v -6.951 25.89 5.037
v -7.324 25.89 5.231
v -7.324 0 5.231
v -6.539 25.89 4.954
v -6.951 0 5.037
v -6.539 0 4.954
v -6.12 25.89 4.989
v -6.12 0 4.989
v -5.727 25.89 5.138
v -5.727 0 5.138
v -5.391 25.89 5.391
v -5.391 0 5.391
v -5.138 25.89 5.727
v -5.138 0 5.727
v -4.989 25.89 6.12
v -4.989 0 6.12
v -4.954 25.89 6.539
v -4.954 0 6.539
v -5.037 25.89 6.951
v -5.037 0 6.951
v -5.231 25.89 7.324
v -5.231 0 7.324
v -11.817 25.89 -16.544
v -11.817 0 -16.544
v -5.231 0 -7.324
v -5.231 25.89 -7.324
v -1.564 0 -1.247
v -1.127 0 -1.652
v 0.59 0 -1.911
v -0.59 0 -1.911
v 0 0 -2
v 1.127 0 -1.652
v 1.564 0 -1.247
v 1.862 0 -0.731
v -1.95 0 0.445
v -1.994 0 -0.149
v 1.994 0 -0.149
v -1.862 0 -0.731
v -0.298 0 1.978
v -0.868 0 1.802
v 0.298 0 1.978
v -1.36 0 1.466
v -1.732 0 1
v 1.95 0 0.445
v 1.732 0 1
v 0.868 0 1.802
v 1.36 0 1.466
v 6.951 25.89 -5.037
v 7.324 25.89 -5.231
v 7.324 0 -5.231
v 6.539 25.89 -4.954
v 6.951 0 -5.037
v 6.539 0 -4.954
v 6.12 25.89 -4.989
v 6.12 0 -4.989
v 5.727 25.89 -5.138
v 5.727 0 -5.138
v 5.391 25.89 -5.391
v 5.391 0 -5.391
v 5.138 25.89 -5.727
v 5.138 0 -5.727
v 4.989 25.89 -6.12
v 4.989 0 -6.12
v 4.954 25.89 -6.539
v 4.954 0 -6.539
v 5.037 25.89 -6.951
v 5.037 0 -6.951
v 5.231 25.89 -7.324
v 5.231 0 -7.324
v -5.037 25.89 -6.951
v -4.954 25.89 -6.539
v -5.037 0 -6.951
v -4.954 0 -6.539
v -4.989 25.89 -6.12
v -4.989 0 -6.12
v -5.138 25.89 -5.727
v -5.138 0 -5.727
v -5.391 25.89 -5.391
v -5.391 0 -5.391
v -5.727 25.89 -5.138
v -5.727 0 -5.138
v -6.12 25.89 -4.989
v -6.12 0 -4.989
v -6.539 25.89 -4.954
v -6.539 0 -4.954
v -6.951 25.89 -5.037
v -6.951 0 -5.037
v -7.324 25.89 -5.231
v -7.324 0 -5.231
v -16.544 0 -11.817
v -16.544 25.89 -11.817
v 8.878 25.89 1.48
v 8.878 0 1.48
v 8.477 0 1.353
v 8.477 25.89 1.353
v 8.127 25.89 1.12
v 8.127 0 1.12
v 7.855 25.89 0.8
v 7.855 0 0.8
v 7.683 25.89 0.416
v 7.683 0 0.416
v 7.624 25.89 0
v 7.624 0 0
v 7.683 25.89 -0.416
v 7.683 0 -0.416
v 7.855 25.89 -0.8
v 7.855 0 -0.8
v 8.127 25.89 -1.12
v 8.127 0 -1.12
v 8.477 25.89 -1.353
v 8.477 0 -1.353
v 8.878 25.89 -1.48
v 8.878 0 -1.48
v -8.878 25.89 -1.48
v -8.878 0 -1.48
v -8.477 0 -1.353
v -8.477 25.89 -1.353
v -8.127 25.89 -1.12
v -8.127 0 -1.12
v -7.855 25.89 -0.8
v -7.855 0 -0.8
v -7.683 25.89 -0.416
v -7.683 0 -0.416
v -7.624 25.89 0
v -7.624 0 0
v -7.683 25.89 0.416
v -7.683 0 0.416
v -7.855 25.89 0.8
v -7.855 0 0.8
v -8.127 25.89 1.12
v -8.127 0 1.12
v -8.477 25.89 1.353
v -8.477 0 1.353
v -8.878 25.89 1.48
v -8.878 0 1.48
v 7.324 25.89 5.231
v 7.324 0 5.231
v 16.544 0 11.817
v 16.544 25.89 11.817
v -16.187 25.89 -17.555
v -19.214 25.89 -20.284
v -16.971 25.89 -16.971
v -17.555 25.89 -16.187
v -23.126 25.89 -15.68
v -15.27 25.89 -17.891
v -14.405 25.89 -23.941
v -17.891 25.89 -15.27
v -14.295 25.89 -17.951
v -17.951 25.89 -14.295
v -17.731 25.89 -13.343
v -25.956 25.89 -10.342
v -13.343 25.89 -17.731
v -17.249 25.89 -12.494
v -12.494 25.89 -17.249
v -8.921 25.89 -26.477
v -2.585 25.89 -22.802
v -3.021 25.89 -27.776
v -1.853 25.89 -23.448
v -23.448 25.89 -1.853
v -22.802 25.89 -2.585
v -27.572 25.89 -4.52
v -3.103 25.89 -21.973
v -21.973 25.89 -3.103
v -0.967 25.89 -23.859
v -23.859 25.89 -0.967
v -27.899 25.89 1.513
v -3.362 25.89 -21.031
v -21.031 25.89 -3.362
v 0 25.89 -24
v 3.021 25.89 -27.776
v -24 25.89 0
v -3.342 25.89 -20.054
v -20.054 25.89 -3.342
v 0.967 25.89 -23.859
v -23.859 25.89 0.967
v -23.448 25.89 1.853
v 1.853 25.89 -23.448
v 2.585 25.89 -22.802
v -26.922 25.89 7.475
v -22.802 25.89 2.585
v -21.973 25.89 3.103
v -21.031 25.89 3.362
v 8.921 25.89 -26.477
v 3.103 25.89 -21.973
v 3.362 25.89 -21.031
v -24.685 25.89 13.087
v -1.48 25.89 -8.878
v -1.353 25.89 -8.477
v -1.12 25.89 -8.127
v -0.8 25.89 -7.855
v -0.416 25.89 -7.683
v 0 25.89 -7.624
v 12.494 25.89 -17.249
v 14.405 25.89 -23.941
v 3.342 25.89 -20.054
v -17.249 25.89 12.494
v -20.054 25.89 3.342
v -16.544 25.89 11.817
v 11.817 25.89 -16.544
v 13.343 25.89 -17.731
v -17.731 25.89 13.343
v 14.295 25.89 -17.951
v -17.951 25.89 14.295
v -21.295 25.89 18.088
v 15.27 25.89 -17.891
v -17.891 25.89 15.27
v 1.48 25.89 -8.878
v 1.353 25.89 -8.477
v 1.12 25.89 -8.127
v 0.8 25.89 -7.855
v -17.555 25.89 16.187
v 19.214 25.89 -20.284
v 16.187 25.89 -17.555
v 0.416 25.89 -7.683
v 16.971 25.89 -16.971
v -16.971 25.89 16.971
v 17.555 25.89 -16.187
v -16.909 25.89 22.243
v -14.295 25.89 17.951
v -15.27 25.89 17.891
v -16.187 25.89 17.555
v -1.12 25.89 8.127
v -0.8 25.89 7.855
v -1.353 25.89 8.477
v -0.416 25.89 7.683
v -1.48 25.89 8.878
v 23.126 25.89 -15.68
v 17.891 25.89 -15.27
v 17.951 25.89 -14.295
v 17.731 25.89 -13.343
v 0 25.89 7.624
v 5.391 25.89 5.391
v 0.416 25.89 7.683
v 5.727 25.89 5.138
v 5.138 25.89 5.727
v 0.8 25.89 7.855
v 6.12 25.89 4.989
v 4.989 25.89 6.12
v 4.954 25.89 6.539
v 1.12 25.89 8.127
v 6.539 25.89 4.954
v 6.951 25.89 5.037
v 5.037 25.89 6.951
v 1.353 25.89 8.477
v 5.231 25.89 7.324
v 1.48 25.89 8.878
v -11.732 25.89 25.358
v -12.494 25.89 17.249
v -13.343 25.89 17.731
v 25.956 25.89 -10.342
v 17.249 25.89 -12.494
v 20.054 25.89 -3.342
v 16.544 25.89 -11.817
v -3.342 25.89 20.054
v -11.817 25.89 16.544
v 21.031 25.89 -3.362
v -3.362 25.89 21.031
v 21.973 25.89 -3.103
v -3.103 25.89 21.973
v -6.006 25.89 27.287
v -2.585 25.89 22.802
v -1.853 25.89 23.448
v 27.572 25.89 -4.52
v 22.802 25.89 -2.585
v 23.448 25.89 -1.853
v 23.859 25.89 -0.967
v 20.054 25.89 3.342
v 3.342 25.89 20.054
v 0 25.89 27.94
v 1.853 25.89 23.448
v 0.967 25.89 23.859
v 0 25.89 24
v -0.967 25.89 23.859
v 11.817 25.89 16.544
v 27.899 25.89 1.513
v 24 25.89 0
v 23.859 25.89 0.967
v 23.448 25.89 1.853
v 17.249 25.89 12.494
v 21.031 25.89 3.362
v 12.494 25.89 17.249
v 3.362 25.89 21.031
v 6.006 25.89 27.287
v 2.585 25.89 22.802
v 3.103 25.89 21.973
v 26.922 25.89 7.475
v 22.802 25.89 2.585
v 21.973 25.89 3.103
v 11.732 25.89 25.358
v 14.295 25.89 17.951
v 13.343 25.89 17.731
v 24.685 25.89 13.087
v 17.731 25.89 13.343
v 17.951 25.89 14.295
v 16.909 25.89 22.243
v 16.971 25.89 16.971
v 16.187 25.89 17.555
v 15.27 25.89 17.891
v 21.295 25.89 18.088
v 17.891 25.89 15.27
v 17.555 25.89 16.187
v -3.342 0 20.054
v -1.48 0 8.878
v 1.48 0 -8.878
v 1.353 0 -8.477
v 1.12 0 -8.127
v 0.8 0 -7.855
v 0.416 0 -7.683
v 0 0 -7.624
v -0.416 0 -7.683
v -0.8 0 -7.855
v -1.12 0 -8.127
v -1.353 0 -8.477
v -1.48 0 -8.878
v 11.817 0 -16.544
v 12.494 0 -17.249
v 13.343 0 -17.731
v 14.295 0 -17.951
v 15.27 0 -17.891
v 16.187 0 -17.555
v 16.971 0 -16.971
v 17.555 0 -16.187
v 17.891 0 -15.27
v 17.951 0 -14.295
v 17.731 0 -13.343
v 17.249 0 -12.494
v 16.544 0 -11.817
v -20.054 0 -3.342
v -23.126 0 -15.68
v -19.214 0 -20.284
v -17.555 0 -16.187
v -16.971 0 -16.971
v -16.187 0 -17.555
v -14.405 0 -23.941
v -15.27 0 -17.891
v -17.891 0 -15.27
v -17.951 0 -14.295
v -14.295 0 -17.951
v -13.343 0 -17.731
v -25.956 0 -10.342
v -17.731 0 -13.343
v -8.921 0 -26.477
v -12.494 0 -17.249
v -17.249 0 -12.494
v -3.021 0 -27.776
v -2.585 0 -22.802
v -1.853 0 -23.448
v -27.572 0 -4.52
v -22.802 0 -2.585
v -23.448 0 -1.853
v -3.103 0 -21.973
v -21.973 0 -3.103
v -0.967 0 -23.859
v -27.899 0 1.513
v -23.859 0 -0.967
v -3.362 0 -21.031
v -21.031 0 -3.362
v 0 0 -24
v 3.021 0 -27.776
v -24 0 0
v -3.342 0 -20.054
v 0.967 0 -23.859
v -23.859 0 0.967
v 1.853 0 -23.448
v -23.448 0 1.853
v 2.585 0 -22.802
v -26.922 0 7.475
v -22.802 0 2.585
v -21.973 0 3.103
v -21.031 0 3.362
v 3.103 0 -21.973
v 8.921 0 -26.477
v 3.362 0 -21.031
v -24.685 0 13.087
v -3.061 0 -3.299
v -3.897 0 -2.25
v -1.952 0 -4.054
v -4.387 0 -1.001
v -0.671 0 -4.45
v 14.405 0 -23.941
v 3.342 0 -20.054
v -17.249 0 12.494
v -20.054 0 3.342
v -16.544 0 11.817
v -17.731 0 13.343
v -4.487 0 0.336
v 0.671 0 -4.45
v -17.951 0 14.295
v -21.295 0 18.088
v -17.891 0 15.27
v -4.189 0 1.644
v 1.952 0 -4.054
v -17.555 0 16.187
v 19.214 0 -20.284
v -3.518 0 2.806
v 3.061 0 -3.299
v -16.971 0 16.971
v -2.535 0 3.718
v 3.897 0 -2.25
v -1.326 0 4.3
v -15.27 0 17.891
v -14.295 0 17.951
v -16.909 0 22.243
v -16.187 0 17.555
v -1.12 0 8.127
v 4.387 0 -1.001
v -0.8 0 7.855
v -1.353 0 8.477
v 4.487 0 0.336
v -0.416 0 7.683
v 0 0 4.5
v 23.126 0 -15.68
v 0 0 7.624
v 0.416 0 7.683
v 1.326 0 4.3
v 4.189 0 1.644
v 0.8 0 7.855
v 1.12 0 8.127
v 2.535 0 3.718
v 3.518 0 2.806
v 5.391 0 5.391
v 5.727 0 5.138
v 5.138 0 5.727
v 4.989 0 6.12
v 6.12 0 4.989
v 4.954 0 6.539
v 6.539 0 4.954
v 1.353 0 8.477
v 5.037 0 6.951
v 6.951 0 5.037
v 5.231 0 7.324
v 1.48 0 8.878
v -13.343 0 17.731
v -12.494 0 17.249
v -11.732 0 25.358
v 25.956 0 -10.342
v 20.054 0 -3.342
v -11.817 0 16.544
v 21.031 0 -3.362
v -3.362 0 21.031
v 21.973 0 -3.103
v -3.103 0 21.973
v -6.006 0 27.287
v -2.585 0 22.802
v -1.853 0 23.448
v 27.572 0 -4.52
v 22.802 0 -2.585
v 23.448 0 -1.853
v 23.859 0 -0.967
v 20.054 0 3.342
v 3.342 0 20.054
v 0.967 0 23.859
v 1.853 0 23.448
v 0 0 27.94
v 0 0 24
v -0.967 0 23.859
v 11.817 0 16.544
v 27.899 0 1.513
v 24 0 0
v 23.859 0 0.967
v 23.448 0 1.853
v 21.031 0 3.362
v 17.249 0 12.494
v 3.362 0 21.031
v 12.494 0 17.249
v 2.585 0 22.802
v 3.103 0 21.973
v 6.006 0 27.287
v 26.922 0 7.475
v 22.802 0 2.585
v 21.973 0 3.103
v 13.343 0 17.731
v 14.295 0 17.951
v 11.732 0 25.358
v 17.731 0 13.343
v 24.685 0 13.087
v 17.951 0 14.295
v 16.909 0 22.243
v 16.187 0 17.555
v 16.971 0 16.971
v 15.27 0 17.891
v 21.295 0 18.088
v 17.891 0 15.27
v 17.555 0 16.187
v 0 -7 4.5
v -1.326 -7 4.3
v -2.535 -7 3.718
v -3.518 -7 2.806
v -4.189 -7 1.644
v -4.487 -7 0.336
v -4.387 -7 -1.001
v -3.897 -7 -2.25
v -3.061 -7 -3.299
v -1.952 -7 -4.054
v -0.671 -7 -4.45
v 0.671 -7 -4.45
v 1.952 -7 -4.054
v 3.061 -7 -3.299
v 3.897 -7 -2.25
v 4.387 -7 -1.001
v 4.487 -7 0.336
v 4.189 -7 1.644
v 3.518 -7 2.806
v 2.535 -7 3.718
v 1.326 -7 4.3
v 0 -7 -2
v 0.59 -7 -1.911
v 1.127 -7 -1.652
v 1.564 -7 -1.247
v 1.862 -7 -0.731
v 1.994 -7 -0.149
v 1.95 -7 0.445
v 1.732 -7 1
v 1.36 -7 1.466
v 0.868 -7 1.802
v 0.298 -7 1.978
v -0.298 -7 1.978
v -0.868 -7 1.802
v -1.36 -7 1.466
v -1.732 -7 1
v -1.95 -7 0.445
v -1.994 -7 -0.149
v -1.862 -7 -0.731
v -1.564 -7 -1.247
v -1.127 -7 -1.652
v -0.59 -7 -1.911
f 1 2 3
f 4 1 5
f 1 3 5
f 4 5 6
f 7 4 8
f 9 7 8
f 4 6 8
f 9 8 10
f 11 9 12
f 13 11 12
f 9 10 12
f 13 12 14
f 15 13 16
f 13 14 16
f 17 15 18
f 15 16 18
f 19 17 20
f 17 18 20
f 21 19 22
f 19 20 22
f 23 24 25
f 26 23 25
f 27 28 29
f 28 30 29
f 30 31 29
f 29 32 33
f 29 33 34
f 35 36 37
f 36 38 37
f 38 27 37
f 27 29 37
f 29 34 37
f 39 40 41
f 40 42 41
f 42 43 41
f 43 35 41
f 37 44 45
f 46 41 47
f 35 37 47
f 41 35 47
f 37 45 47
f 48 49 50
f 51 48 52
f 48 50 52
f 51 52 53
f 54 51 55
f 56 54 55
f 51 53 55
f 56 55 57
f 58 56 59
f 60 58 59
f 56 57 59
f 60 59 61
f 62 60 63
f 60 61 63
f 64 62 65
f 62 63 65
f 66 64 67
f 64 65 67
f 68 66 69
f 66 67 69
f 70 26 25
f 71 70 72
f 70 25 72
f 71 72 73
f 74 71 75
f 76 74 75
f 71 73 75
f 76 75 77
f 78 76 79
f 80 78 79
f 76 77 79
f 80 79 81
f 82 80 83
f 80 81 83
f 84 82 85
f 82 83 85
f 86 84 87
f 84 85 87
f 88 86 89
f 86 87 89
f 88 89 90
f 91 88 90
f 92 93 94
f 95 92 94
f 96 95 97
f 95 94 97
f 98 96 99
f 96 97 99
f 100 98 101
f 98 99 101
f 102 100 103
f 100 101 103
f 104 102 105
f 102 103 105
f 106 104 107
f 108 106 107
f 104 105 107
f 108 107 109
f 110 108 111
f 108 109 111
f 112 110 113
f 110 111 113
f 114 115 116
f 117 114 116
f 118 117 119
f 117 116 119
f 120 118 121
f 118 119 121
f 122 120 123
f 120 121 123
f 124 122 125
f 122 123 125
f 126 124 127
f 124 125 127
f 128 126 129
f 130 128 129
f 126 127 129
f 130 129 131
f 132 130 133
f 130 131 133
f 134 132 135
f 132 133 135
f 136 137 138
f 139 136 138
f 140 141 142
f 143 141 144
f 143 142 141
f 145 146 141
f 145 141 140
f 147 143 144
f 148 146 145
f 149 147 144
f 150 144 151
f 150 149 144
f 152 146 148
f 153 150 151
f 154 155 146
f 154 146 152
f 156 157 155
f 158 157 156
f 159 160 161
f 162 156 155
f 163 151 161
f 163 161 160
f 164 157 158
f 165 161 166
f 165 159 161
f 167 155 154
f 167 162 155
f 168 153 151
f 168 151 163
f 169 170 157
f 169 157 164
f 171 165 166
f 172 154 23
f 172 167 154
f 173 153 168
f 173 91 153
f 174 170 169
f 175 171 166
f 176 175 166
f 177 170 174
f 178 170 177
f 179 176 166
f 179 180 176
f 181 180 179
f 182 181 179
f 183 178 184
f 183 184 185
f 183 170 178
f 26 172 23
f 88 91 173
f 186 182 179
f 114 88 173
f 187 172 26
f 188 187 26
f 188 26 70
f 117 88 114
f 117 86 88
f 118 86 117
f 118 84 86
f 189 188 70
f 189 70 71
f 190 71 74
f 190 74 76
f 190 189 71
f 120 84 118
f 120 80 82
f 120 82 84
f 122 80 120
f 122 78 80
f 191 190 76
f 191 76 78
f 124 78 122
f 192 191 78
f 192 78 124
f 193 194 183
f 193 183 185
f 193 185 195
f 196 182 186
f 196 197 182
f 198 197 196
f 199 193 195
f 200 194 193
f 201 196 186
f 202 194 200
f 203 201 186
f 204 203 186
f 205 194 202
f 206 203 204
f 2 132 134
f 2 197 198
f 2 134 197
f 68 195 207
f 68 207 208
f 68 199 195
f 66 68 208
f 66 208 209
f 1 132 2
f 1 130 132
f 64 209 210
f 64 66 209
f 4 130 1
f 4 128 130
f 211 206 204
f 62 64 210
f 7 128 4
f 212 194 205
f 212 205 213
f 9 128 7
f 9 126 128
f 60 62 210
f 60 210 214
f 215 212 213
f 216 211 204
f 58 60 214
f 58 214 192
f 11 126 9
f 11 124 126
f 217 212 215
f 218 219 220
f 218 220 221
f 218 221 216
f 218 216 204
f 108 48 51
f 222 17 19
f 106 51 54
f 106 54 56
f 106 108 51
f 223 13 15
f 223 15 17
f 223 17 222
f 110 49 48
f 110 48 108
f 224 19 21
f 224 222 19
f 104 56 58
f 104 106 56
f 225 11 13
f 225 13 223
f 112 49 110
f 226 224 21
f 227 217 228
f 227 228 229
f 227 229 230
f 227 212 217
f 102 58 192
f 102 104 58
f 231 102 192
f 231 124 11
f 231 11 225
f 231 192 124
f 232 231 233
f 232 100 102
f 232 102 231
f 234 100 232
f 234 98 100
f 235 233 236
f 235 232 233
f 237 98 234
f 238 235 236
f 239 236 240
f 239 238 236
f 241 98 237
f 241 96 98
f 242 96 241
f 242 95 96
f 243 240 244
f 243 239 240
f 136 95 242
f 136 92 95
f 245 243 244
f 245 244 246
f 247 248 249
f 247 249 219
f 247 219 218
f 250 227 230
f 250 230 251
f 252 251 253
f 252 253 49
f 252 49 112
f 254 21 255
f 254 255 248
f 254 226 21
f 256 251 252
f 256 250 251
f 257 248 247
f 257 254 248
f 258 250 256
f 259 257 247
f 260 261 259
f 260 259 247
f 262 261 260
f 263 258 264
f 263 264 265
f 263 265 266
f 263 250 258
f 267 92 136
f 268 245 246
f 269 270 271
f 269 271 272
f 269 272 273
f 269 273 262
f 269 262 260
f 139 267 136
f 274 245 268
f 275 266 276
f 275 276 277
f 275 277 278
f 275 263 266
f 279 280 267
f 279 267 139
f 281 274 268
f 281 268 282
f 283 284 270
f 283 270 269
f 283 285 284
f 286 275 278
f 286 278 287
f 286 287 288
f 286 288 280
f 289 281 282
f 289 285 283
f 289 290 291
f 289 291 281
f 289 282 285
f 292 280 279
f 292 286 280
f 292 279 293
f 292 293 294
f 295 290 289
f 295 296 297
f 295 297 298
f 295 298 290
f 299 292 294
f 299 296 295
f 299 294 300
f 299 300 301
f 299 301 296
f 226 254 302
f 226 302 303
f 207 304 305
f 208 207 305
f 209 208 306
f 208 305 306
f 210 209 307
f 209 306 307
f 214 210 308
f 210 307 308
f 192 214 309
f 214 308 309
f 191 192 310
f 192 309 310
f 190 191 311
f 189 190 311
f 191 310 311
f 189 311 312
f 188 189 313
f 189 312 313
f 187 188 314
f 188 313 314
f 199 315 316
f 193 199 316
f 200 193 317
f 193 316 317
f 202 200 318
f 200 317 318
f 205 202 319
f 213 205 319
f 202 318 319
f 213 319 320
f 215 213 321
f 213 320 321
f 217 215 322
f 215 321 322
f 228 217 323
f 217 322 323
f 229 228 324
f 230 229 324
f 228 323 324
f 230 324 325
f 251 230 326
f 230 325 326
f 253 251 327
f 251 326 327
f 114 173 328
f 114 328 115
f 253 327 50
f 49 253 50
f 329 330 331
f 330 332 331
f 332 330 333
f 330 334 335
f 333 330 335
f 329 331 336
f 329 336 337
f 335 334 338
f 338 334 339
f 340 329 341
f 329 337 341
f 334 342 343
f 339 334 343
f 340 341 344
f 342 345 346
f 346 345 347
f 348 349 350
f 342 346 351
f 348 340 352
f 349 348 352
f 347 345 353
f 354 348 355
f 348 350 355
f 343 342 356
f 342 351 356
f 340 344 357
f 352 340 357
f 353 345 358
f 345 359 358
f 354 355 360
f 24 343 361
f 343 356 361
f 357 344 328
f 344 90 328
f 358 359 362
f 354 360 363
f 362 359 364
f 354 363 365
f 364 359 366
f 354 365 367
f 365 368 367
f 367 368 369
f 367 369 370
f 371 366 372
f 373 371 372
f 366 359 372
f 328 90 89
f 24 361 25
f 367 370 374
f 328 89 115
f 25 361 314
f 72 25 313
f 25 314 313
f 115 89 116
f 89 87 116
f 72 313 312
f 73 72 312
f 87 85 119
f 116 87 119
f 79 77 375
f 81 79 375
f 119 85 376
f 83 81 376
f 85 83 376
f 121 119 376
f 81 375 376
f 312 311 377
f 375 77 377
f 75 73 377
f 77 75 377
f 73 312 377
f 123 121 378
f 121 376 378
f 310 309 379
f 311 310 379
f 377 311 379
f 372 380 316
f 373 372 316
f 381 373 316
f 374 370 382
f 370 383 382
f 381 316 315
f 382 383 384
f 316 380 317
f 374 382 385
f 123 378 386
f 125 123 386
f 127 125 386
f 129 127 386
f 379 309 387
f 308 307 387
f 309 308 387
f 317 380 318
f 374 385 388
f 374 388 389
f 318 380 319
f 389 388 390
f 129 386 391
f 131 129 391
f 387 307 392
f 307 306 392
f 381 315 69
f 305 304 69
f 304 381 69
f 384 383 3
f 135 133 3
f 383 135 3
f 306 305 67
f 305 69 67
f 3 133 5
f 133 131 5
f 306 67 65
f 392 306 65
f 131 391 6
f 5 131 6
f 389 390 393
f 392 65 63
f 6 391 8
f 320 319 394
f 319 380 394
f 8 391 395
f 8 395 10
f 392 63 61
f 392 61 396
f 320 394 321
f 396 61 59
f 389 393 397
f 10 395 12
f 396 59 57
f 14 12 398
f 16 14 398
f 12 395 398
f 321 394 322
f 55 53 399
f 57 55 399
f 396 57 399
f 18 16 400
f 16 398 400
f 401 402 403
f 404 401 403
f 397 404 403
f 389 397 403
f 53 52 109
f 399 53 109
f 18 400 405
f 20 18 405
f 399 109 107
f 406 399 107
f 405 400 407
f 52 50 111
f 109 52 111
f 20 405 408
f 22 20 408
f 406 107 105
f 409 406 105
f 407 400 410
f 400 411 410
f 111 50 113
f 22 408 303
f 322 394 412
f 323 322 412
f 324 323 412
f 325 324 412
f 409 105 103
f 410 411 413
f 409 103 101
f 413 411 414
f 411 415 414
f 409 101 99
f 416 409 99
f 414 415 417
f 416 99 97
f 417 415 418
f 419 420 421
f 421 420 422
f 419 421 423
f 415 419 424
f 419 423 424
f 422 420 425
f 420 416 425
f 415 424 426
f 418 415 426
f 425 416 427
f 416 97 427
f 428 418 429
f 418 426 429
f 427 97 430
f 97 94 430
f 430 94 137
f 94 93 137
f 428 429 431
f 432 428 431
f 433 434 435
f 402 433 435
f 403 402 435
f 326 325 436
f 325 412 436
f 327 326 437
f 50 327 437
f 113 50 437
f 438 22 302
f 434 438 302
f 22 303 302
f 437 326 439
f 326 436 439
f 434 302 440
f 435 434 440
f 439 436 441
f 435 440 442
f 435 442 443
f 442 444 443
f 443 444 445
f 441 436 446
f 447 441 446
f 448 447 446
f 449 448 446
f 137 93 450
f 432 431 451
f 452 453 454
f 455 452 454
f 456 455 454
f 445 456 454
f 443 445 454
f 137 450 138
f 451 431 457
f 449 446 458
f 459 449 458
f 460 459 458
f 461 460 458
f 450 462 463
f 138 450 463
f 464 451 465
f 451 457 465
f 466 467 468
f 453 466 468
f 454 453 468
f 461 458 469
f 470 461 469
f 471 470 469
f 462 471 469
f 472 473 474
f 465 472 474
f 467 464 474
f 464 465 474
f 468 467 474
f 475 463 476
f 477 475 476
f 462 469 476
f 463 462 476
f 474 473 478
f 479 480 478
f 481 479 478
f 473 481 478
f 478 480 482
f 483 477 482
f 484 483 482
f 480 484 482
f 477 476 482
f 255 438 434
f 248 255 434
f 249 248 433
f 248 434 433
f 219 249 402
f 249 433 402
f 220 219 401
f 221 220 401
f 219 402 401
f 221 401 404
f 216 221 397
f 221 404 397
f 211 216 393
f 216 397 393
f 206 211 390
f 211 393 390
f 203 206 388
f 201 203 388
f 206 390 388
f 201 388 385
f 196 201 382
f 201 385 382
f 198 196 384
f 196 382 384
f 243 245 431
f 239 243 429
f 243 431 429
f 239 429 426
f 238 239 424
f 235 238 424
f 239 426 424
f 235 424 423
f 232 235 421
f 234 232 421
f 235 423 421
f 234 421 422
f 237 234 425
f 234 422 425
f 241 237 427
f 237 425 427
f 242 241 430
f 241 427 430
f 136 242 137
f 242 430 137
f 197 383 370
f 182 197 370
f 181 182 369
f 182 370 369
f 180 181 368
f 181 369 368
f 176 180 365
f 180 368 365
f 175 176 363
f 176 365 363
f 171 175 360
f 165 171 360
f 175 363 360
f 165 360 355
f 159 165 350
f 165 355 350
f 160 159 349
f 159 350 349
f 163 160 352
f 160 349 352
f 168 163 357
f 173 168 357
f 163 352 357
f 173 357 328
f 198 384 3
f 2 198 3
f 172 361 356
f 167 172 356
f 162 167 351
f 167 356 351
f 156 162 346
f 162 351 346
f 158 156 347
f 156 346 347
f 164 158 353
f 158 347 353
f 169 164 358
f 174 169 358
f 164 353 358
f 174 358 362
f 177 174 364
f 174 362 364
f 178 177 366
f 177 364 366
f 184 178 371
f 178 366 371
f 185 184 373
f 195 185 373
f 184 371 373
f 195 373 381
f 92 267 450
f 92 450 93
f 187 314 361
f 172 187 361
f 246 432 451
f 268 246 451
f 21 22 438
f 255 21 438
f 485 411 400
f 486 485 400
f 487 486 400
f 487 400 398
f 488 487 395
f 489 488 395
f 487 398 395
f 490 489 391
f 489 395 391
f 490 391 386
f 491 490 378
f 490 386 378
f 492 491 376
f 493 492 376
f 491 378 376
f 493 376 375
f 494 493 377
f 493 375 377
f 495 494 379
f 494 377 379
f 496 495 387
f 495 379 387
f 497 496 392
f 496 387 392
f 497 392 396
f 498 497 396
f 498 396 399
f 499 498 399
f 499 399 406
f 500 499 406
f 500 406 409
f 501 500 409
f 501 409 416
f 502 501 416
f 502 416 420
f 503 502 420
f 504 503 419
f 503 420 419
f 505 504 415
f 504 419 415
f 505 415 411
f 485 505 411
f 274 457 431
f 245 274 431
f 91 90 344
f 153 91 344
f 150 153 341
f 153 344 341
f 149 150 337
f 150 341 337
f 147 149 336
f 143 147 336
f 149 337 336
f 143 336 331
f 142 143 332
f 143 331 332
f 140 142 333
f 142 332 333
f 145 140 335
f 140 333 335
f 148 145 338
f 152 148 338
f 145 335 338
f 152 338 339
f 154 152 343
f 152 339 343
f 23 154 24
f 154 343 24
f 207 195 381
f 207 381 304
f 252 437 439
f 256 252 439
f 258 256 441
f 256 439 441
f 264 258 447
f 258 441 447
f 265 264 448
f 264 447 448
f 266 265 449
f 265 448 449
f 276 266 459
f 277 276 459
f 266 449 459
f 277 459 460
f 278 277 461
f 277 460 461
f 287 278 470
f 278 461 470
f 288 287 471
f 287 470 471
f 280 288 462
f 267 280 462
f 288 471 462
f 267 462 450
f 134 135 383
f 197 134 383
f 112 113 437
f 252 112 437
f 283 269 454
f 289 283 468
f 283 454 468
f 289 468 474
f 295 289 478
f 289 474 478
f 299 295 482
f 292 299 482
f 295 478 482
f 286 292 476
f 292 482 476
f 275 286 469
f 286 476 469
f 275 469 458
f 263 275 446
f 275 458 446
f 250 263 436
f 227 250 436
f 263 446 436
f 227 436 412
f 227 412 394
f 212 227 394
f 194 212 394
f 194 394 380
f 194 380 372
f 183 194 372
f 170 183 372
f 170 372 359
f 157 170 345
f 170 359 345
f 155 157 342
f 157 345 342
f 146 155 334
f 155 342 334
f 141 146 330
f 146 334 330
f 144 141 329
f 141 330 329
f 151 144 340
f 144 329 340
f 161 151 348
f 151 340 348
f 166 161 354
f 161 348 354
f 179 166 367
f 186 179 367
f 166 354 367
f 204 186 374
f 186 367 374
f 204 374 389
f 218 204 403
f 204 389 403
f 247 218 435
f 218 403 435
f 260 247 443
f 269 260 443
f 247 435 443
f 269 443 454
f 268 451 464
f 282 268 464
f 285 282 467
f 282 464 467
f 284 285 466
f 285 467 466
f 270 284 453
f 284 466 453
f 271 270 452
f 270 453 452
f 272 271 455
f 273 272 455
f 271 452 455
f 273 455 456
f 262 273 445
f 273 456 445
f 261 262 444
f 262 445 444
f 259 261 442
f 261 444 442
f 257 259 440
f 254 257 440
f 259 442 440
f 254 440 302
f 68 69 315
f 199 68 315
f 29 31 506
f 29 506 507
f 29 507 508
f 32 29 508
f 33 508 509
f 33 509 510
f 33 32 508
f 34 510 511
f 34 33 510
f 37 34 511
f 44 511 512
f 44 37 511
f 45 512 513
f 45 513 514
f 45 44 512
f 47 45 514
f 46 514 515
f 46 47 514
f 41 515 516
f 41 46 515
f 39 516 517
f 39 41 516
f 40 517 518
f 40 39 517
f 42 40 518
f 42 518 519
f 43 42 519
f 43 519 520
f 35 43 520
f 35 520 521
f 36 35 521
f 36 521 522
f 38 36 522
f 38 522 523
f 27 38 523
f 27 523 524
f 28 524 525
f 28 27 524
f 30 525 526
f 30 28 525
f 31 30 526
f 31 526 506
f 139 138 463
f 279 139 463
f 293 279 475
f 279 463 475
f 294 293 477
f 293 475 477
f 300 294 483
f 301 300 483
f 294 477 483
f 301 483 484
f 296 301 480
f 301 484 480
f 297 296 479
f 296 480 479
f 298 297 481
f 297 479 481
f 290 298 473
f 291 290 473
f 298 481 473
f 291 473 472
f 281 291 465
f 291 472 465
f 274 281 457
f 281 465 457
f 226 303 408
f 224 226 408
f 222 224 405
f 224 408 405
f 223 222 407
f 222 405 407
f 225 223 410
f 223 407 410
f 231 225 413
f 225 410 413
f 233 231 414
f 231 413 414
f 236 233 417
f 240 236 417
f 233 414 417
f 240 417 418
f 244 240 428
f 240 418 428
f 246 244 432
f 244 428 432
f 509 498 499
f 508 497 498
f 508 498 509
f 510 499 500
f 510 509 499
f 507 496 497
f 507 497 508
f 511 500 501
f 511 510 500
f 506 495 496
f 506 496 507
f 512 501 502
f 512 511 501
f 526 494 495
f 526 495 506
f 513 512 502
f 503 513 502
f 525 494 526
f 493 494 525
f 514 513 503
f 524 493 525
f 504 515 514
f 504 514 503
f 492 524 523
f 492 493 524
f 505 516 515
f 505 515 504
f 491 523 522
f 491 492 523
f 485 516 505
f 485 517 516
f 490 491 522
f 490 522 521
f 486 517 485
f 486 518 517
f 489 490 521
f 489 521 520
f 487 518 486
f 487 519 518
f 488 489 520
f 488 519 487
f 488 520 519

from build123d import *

# Parameters (mm, degrees)
SKETCH1_R           = 27.94
BOSS_EXTRUDE1_DEPTH = 25.89
CUT_EXTRUDE2_DEPTH  = 48.239594621
SKETCH4_R           = 4.5
SKETCH4_R_2         = 2
BOSS_EXTRUDE3_DEPTH = 7


with BuildPart() as part:
    # Sketch1 → Boss-Extrude1 (new body)
    with BuildSketch(Plane(origin=(0, 0, 0), x_dir=(1, 0, 0), z_dir=(0, 1, 0))):
        with Locations(Location((0, 0, 0), (0, 0, 270))):
            Circle(SKETCH1_R)
    extrude(amount=BOSS_EXTRUDE1_DEPTH)

    # Sketch2 → Cut-Extrude2 (cut, through all)
    with BuildSketch(Plane.XZ):
        with BuildLine():
            Line((1.479590886, 8.877545314), (3.342404051, 20.054424305))
            ThreePointArc((3.342404051, 20.054424305), (0, 24), (-3.342404051, 20.054424305))
            Line((-3.342404051, 20.054424305), (-1.479590886, 8.877545314))
            ThreePointArc((-1.479590886, 8.877545314), (0, 7.624143795), (1.479590886, 8.877545314))
        make_face()
        with BuildLine():
            Line((7.323601241, 5.231143743), (16.544055988, 11.817182849))
            ThreePointArc((16.544055988, 11.817182849), (16.970562748, 16.970562748), (11.817182849, 16.544055988))
            Line((11.817182849, 16.544055988), (5.231143743, 7.323601241))
            ThreePointArc((5.231143743, 7.323601241), (5.391083779, 5.391083779), (7.323601241, 5.231143743))
        make_face()
        with BuildLine():
            Line((8.877545314, -1.479590886), (20.054424305, -3.342404051))
            ThreePointArc((20.054424305, -3.342404051), (24, 0), (20.054424305, 3.342404051))
            Line((20.054424305, 3.342404051), (8.877545314, 1.479590886))
            ThreePointArc((8.877545314, 1.479590886), (7.624143795, 0), (8.877545314, -1.479590886))
        make_face()
        with BuildLine():
            Line((5.231143743, -7.323601241), (11.817182849, -16.544055988))
            ThreePointArc((11.817182849, -16.544055988), (16.970562748, -16.970562748), (16.544055988, -11.817182849))
            Line((16.544055988, -11.817182849), (7.323601241, -5.231143743))
            ThreePointArc((7.323601241, -5.231143743), (5.391083779, -5.391083779), (5.231143743, -7.323601241))
        make_face()
        with BuildLine():
            Line((-1.479590886, -8.877545314), (-3.342404051, -20.054424305))
            ThreePointArc((-3.342404051, -20.054424305), (0, -24), (3.342404051, -20.054424305))
            Line((3.342404051, -20.054424305), (1.479590886, -8.877545314))
            ThreePointArc((1.479590886, -8.877545314), (0, -7.624143795), (-1.479590886, -8.877545314))
        make_face()
        with BuildLine():
            Line((-7.323601241, -5.231143743), (-16.544055988, -11.817182849))
            ThreePointArc((-16.544055988, -11.817182849), (-16.970562748, -16.970562748), (-11.817182849, -16.544055988))
            Line((-11.817182849, -16.544055988), (-5.231143743, -7.323601241))
            ThreePointArc((-5.231143743, -7.323601241), (-5.391083779, -5.391083779), (-7.323601241, -5.231143743))
        make_face()
        with BuildLine():
            Line((-8.877545314, 1.479590886), (-20.054424305, 3.342404051))
            ThreePointArc((-20.054424305, 3.342404051), (-24, 0), (-20.054424305, -3.342404051))
            Line((-20.054424305, -3.342404051), (-8.877545314, -1.479590886))
            ThreePointArc((-8.877545314, -1.479590886), (-7.624143795, 0), (-8.877545314, 1.479590886))
        make_face()
        with BuildLine():
            Line((-5.231143743, 7.323601241), (-11.817182849, 16.544055988))
            ThreePointArc((-11.817182849, 16.544055988), (-16.970562748, 16.970562748), (-16.544055988, 11.817182849))
            Line((-16.544055988, 11.817182849), (-7.323601241, 5.231143743))
            ThreePointArc((-7.323601241, 5.231143743), (-5.391083779, 5.391083779), (-5.231143743, 7.323601241))
        make_face()
    extrude(amount=-CUT_EXTRUDE2_DEPTH, mode=Mode.SUBTRACT)

    # Sketch4 → Boss-Extrude3 (add)
    with BuildSketch(Plane(origin=(0, 0, 0), x_dir=(-1, 0, 0), z_dir=(0, -1, 0))):
        with Locations(Location((0, 0, 0), (0, 0, 270))):
            Circle(SKETCH4_R)
        with Locations(Location((0, 0, 0), (0, 0, 90))):
            Circle(SKETCH4_R_2, mode=Mode.SUBTRACT)
    extrude(amount=BOSS_EXTRUDE3_DEPTH)


solid = part.part
